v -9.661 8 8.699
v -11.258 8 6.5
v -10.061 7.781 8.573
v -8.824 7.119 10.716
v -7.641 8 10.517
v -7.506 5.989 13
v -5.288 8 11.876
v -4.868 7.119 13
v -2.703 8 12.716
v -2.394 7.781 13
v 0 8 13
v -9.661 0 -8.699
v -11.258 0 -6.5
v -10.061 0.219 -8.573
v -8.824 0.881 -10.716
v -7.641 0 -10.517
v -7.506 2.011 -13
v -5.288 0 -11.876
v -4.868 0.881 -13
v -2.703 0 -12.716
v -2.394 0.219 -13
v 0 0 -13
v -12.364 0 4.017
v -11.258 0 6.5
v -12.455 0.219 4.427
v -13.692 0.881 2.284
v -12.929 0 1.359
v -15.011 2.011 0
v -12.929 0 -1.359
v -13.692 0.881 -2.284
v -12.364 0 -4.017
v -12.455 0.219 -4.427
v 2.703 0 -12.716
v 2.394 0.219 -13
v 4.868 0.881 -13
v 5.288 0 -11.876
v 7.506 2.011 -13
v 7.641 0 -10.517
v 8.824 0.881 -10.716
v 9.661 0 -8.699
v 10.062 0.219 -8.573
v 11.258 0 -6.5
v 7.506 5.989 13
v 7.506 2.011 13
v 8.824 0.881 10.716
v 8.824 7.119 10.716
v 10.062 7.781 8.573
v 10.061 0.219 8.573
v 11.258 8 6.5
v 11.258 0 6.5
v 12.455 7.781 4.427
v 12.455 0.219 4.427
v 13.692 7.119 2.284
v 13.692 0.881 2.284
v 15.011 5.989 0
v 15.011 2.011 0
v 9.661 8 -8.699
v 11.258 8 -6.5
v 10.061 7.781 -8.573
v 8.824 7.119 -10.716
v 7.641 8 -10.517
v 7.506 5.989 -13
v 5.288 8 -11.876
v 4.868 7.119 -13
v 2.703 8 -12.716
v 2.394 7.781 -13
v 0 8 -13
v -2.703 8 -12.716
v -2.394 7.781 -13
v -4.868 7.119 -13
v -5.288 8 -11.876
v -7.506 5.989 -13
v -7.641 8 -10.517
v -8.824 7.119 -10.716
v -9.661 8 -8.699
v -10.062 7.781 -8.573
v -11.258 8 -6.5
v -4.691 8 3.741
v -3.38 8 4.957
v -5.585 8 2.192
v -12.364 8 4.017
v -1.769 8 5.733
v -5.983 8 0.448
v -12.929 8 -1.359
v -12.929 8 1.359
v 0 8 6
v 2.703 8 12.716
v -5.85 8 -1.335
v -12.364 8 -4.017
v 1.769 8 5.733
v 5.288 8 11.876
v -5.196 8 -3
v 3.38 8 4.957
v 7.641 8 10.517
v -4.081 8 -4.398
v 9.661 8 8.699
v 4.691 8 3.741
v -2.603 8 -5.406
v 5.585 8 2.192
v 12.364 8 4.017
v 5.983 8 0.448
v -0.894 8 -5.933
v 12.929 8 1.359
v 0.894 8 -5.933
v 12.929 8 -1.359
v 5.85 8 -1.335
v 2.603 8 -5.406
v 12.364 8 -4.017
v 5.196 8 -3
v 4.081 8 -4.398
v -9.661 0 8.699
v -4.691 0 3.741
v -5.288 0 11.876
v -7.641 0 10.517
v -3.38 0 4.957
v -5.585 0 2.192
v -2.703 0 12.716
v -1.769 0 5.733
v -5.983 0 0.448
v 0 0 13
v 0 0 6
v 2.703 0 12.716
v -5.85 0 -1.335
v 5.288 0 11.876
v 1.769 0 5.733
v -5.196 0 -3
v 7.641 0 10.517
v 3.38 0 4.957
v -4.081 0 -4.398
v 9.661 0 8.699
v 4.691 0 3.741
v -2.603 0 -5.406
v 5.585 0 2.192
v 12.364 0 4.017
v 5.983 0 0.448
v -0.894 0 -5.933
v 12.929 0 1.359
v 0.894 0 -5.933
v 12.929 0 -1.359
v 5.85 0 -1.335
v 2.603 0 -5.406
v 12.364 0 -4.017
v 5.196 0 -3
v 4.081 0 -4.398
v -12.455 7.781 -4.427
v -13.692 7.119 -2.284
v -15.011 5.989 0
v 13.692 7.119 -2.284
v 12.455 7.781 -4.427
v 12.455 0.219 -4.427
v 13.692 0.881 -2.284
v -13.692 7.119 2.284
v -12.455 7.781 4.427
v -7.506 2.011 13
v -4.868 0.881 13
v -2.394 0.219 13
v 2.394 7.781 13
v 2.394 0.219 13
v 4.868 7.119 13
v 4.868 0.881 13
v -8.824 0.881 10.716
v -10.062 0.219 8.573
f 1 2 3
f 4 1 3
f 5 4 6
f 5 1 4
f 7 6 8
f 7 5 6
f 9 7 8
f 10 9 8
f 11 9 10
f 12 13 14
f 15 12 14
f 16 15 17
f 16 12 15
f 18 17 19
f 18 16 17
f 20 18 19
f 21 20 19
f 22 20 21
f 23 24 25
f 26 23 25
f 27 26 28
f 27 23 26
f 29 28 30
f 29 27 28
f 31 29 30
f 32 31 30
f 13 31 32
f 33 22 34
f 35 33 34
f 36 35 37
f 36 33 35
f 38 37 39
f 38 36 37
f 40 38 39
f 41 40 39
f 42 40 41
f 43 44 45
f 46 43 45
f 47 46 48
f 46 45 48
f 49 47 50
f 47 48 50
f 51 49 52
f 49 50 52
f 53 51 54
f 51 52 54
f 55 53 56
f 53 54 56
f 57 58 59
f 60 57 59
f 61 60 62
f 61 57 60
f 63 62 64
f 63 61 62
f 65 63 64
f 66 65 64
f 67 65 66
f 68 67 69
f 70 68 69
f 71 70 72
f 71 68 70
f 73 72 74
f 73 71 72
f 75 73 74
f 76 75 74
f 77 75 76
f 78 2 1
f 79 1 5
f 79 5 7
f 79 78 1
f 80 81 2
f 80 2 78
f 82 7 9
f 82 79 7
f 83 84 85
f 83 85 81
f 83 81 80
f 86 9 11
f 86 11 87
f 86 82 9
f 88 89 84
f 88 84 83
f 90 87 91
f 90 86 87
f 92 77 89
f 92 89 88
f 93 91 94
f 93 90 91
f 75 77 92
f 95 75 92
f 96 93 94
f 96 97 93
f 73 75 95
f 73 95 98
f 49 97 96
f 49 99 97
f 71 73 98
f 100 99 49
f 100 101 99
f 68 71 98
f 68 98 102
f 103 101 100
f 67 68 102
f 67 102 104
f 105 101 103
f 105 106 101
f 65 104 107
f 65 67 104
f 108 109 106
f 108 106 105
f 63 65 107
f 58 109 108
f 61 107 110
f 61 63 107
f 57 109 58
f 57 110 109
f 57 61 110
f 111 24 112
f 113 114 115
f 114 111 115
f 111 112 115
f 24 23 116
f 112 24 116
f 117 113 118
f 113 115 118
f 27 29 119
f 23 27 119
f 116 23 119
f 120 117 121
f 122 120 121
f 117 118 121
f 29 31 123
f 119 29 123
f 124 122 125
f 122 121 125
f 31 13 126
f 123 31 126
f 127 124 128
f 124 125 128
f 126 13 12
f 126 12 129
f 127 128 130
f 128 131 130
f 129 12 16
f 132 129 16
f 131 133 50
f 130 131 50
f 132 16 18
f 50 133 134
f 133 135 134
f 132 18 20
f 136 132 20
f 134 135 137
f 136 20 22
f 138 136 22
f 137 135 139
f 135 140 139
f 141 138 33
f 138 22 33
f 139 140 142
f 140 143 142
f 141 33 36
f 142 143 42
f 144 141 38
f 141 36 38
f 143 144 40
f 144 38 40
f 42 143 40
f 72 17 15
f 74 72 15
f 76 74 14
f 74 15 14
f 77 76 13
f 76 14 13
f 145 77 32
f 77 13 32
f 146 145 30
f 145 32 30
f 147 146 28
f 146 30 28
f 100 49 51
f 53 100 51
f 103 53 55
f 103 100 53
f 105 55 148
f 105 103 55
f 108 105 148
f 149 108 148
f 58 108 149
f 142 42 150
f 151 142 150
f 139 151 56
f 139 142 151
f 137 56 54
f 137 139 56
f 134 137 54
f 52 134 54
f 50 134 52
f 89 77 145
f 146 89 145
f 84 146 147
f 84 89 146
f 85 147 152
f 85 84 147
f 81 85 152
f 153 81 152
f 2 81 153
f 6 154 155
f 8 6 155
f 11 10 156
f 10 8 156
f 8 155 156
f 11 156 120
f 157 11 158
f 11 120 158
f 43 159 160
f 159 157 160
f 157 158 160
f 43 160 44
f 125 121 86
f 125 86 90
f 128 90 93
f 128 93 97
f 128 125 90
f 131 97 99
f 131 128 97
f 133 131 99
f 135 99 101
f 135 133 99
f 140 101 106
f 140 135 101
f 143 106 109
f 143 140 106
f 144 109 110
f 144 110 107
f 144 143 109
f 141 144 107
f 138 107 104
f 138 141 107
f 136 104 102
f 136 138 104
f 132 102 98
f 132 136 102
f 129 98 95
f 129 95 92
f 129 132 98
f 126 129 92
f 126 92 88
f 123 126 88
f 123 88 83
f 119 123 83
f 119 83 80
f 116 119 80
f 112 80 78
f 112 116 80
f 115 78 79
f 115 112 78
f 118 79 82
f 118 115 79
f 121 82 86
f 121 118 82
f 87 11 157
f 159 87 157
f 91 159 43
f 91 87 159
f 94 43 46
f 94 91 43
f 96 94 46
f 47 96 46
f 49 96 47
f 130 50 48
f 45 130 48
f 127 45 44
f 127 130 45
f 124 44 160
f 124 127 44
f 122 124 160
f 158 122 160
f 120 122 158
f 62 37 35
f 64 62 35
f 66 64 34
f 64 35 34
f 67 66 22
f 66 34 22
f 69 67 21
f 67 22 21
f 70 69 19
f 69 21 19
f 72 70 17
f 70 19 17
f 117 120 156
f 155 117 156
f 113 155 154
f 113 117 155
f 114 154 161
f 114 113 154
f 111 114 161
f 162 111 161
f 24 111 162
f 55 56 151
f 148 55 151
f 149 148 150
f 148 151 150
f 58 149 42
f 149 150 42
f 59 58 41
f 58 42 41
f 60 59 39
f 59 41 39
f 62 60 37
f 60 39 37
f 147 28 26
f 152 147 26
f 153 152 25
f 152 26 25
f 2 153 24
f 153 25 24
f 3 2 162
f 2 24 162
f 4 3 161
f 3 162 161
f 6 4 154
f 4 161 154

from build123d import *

# Parameters (mm, degrees)
SKETCH1_R           = 6
BOSS_EXTRUDE1_DEPTH = 8
SKETCH2_OUTSIDE_W   = 84.942
SKETCH2_OUTSIDE_H   = 80.92
SKETCH2_OUTSIDE_R   = 13
CUT_EXTRUDE1_DEPTH  = 22.408720964
CUT_EXTRUDE1_DRAFT  = -45
SKETCH5_OUTSIDE_W   = 84.942
SKETCH5_OUTSIDE_H   = 80.92
SKETCH5_OUTSIDE_R   = 13
CUT_EXTRUDE2_DEPTH  = 22.408720964
CUT_EXTRUDE2_DRAFT  = -45


with BuildPart() as part:
    # Sketch1 → Boss-Extrude1 (new body)
    with BuildSketch(Plane(origin=(0, 0, 0), x_dir=(1, 0, 0), z_dir=(0, 1, 0))):
        Polygon((-15.011106999, 0), (-7.505553499, -13), (7.505553499, -13), (15.011106999, 0), (7.505553499, 13), (-7.505553499, 13), align=None)
        with Locations(Location((0, 0, 0), (0, 0, 270))):
            Circle(SKETCH1_R, mode=Mode.SUBTRACT)
    extrude(amount=BOSS_EXTRUDE1_DEPTH)


with BuildPart() as cut_extrude1_tool:
    # Sketch2 outside → Cut-Extrude1 (with draft: the straight prism first)
    with BuildSketch(Plane(origin=(0, 8, 0), x_dir=(1, 0, 0), z_dir=(0, 1, 0))):
        Rectangle(SKETCH2_OUTSIDE_W, SKETCH2_OUTSIDE_H)
        Circle(SKETCH2_OUTSIDE_R, mode=Mode.SUBTRACT)
    extrude(amount=-CUT_EXTRUDE1_DEPTH)
    # Cut-Extrude1: the draft: its side faces are tilted about the plane it starts from
    cut_extrude1_sides = [cut_extrude1_tool.faces().sort_by_distance(p)[0] for p in [
        (0, -3.204360482, 40.46),
        (42.471, -3.204360482, 0),
        (0, -3.204360482, -40.46),
        (-42.471, -3.204360482, 0),
        (-13, -3.204360482, 0),
    ]]
    draft(cut_extrude1_sides, Plane(origin=(0, 8, 0), x_dir=(1, 0, 0), z_dir=(0, 1, 0)), CUT_EXTRUDE1_DRAFT)


with BuildPart() as part_1:
    add(part.part)

    # Cut-Extrude1: cut by cut_extrude1_tool
    add(cut_extrude1_tool.part, mode=Mode.SUBTRACT)


with BuildPart() as cut_extrude2_tool:
    # Sketch5 outside → Cut-Extrude2 (with draft: the straight prism first)
    with BuildSketch(Plane(origin=(0, 0, 0), x_dir=(-1, 0, 0), z_dir=(0, -1, 0))):
        Rectangle(SKETCH5_OUTSIDE_W, SKETCH5_OUTSIDE_H)
        Circle(SKETCH5_OUTSIDE_R, mode=Mode.SUBTRACT)
    extrude(amount=-CUT_EXTRUDE2_DEPTH)
    # Cut-Extrude2: the draft: its side faces are tilted about the plane it starts from
    cut_extrude2_sides = [cut_extrude2_tool.faces().sort_by_distance(p)[0] for p in [
        (0, 11.204360482, 40.46),
        (-42.471, 11.204360482, 0),
        (0, 11.204360482, -40.46),
        (42.471, 11.204360482, 0),
        (13, 11.204360482, 0),
    ]]
    draft(cut_extrude2_sides, Plane(origin=(0, 0, 0), x_dir=(-1, 0, 0), z_dir=(0, -1, 0)), CUT_EXTRUDE2_DRAFT)


with BuildPart() as part_2:
    add(part_1.part)

    # Cut-Extrude2: cut by cut_extrude2_tool
    add(cut_extrude2_tool.part, mode=Mode.SUBTRACT)


solid = part_2.part
